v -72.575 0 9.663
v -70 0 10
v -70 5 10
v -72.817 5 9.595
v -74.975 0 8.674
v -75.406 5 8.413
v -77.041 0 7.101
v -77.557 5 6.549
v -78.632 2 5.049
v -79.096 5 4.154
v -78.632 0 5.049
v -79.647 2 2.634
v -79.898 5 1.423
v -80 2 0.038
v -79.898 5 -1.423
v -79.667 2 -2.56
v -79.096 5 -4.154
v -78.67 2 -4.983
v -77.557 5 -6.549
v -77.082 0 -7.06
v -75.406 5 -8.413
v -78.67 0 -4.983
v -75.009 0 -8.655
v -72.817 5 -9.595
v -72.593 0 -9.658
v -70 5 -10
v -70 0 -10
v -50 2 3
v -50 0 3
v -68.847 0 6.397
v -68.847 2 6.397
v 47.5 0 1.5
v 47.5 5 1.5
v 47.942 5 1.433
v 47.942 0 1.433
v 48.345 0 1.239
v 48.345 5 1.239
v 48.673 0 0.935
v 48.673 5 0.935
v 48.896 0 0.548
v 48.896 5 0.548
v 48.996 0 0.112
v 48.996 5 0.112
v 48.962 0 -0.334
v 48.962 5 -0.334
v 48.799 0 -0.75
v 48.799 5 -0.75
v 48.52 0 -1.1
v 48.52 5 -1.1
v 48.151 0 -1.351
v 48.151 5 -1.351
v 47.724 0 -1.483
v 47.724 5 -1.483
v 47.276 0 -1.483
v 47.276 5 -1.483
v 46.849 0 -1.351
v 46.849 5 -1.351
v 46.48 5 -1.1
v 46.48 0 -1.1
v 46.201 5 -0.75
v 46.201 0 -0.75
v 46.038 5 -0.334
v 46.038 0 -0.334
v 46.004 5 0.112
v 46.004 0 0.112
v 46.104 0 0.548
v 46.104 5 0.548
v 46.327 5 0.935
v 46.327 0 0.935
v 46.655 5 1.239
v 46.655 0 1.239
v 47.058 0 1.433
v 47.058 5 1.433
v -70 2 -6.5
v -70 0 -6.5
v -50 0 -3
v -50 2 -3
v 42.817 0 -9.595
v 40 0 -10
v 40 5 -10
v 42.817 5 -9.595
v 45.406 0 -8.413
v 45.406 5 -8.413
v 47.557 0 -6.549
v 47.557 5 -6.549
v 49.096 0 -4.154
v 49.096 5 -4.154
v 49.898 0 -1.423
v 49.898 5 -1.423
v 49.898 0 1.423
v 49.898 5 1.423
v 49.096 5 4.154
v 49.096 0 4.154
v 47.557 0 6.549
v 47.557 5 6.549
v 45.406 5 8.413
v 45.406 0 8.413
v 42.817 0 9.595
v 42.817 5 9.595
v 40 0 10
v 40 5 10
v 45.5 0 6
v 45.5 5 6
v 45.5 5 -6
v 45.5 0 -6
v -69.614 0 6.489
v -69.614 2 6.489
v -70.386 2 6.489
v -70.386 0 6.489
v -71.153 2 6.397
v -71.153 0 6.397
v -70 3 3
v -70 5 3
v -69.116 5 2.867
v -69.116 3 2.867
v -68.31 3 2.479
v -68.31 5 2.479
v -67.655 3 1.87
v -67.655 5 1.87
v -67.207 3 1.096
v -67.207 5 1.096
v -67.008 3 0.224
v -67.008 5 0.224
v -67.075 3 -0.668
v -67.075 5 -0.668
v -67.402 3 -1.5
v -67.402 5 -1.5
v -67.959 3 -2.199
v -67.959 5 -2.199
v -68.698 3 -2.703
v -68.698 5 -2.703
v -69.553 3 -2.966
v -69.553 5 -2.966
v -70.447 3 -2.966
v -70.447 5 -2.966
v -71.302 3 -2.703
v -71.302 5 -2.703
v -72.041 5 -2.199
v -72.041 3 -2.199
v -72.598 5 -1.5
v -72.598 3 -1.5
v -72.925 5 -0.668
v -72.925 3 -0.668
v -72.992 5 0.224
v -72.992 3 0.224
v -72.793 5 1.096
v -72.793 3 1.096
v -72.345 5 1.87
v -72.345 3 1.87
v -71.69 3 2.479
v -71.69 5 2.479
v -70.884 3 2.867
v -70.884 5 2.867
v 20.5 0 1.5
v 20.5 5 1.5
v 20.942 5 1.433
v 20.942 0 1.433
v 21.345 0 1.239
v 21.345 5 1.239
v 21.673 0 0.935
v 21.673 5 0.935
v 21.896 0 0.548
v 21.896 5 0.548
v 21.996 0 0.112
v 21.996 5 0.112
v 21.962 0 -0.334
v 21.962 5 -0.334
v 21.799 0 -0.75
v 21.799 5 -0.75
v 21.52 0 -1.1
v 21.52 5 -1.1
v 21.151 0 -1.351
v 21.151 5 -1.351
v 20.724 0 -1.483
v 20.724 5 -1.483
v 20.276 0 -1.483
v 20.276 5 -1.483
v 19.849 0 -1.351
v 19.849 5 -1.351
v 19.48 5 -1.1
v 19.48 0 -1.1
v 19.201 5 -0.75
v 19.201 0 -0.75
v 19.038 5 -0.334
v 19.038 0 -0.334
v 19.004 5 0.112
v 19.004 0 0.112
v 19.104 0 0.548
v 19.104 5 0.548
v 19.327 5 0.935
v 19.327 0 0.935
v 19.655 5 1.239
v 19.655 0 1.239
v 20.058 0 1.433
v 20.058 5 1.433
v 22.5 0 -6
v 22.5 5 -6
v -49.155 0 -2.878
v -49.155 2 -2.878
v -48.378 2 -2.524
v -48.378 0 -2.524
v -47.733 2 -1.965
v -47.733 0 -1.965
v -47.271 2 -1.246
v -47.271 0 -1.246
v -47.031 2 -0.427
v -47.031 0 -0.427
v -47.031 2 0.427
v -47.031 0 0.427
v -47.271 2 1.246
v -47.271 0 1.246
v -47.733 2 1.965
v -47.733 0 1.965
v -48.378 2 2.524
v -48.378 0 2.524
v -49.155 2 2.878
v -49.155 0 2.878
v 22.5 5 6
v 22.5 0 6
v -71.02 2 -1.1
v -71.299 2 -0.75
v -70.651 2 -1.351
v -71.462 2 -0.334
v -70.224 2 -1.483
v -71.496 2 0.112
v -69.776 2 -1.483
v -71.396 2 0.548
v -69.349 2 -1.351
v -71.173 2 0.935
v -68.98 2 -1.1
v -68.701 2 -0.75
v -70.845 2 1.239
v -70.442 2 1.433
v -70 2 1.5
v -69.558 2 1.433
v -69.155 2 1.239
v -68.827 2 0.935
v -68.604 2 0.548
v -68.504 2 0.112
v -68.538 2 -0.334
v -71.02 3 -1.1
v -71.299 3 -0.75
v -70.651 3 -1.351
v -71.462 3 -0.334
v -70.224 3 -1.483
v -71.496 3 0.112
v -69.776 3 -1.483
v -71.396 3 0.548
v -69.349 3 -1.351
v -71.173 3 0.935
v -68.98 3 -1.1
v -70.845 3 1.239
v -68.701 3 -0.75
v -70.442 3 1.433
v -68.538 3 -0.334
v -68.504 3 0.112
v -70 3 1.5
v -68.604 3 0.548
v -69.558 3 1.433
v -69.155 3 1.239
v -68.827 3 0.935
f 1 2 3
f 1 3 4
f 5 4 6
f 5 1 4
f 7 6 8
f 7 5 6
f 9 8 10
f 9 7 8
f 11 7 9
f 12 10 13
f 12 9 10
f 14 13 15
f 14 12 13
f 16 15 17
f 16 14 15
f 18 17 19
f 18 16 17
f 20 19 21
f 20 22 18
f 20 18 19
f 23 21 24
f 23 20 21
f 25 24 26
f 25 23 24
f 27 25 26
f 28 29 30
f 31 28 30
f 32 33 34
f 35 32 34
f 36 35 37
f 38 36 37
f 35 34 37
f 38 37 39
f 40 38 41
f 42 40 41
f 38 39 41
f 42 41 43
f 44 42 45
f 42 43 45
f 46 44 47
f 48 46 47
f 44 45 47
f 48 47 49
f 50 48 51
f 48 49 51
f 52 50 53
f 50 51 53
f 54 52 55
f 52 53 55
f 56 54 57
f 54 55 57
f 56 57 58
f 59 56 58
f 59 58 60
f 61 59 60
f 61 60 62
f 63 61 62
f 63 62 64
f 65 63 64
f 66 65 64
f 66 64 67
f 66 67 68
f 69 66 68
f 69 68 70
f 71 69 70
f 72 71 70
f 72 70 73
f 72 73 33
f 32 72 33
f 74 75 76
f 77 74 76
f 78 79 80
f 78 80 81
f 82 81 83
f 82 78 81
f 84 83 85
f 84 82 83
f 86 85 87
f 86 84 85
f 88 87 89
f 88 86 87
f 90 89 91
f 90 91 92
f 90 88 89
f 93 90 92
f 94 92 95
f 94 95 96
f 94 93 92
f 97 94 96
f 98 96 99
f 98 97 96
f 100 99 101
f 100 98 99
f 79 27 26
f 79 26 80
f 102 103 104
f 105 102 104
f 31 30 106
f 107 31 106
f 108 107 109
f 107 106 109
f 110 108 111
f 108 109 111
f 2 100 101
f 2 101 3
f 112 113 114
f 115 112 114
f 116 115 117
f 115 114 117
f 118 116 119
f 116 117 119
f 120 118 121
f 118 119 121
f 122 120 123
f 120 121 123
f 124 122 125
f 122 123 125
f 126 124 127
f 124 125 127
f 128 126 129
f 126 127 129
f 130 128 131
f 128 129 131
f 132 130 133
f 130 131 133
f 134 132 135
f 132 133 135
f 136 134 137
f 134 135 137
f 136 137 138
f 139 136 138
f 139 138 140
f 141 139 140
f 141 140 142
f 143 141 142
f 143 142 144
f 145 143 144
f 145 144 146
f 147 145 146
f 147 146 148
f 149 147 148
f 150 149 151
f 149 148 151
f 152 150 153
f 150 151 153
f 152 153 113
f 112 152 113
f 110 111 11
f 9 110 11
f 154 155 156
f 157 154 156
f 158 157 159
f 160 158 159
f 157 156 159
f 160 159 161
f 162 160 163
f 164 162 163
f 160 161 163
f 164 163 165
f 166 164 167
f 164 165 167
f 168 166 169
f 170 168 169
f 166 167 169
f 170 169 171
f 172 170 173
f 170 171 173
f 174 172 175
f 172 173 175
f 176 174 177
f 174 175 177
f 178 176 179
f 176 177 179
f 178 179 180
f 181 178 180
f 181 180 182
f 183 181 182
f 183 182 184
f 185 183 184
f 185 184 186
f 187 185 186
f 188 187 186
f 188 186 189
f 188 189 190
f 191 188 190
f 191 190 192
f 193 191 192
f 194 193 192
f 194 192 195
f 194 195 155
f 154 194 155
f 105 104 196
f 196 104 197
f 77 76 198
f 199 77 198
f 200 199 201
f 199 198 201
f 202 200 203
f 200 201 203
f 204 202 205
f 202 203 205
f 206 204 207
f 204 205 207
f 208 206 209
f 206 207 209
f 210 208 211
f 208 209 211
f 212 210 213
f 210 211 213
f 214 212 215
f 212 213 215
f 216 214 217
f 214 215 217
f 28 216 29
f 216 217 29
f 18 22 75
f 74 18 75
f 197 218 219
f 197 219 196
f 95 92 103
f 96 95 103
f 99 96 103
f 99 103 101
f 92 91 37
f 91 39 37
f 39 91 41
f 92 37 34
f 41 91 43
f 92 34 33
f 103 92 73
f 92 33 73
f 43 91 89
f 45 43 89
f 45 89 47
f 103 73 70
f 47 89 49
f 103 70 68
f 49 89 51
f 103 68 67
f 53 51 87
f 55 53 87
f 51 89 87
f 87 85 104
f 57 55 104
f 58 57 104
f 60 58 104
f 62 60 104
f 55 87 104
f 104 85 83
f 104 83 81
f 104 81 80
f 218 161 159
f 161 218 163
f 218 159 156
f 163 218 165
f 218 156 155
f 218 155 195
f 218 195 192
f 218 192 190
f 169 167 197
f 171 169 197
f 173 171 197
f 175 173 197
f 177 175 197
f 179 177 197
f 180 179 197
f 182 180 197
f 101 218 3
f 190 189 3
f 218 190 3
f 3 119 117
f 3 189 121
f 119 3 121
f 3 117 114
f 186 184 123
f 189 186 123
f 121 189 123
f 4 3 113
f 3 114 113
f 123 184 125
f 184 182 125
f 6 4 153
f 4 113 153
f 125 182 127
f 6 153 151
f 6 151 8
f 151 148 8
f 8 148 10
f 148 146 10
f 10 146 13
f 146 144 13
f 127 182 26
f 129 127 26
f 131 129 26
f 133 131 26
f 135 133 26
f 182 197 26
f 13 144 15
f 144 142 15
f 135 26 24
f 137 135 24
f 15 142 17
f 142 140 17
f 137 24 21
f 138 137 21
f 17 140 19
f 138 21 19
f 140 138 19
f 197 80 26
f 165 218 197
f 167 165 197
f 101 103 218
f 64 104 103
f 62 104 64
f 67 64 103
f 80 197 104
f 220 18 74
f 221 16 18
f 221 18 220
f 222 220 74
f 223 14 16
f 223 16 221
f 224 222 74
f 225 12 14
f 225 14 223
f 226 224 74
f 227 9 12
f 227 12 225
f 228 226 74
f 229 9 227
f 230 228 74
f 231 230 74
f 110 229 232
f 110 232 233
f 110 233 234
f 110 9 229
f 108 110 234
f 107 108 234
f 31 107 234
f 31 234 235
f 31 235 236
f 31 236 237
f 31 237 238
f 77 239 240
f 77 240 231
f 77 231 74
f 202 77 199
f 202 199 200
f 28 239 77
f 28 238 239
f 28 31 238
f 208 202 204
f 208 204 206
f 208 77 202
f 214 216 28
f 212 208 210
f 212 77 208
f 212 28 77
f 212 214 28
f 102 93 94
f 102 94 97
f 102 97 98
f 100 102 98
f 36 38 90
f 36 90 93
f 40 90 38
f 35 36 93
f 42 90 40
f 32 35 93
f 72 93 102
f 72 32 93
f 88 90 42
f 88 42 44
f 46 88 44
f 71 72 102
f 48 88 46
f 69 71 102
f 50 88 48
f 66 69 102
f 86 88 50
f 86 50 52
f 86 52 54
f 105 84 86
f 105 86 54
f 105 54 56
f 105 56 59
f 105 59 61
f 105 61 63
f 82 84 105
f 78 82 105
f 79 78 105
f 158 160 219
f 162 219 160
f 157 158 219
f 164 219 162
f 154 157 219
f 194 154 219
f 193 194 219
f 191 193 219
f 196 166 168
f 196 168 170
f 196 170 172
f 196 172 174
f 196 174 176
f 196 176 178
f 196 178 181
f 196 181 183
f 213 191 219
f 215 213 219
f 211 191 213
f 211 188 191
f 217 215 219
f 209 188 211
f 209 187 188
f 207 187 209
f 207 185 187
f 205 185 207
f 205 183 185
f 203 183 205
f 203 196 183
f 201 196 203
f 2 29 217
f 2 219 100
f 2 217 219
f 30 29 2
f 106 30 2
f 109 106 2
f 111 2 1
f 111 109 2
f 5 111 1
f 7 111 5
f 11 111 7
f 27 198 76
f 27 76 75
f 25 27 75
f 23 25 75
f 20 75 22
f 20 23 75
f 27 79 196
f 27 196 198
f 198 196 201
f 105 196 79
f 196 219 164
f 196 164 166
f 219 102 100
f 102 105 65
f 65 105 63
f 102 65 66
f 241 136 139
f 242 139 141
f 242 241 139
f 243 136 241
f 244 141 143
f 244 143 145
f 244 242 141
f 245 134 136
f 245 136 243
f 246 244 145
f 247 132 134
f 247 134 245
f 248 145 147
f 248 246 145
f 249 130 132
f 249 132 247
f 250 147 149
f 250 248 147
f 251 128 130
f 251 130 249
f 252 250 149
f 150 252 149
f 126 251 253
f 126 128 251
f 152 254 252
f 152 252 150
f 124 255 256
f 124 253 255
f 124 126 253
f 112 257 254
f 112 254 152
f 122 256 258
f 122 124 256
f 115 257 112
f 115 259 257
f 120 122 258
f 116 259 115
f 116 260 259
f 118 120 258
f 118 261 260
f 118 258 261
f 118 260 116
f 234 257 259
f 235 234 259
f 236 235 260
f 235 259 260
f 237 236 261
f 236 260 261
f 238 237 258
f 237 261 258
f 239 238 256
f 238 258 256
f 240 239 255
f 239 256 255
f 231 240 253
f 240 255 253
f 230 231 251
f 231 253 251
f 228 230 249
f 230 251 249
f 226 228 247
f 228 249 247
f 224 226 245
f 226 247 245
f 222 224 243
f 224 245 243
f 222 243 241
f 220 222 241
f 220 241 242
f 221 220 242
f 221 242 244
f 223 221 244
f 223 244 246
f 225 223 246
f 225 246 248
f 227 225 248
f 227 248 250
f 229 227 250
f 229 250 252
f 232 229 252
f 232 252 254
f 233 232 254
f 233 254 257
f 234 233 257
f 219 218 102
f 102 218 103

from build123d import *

# Parameters (mm, degrees)
BOSS_EXTRUDE1_DEPTH = 5
SKETCH3_W           = 17.5
SKETCH3_H           = 12
SKETCH3_W_2         = 5.5
SKETCH3_R           = 1.5
CUT_EXTRUDE1_DEPTH  = 81.777472107
SKETCH5_R           = 3
CUT_EXTRUDE2_DEPTH  = 2
CUT_EXTRUDE3_DEPTH  = 2
SKETCH8_R           = 1.5
CUT_EXTRUDE4_DEPTH  = 81.678373806


with BuildPart() as part:
    # Sketch1 → Boss-Extrude1 (new body)
    with BuildSketch(Plane(origin=(0, 0, 0), x_dir=(1, 0, 0), z_dir=(0, 1, 0))):
        with BuildLine():
            Line((-40, 10), (40, 10))
            ThreePointArc((40, 10), (50, 0), (40, -10))
            Line((40, -10), (-40, -10))
            Line((-40, -10), (-70, -10))
            ThreePointArc((-70, -10), (-80, 0), (-70, 10))
            Line((-70, 10), (-40, 10))
        make_face()
    extrude(amount=BOSS_EXTRUDE1_DEPTH)

    # Sketch3 → Cut-Extrude1 (cut, through all)
    with BuildSketch(Plane(origin=(0, 5, 0), x_dir=(1, 0, 0), z_dir=(0, 1, 0))):
        with Locations((31.25, 0)):
            Rectangle(SKETCH3_W, SKETCH3_H)
        with Locations((42.75, 0)):
            Rectangle(SKETCH3_W_2, SKETCH3_H)
        with Locations(Location((20.5, 0, 0), (0, 0, 270))):
            Circle(SKETCH3_R)
        with Locations(Location((47.5, 0, 0), (0, 0, 270))):
            Circle(SKETCH3_R)
    extrude(amount=-CUT_EXTRUDE1_DEPTH, mode=Mode.SUBTRACT)

    # Sketch5 → Cut-Extrude2 (cut)
    with BuildSketch(Plane(origin=(0, 5, 0), x_dir=(1, 0, 0), z_dir=(0, 1, 0))):
        with Locations(Location((-70, 0, 0), (0, 0, 270))):
            Circle(SKETCH5_R)
    extrude(amount=-CUT_EXTRUDE2_DEPTH, mode=Mode.SUBTRACT)

    # Sketch6 → Cut-Extrude3 (cut)
    with BuildSketch(Plane.XZ):
        with BuildLine():
            Line((-71.152960707, 6.396927513), (-78.631797828, 5.04896685))
            ThreePointArc((-78.631797828, 5.04896685), (-79.999926685, 0.038292326), (-78.670211746, -4.982712945))
            Line((-78.670211746, -4.982712945), (-70, -6.5))
            Line((-70, -6.5), (-50, -3))
            ThreePointArc((-50, -3), (-47, 0), (-50, 3))
            Line((-50, 3), (-68.847039198, 6.396927496))
            ThreePointArc((-68.847039198, 6.396927496), (-69.999999952, 6.5), (-71.152960707, 6.396927513))
        make_face()
    extrude(amount=-CUT_EXTRUDE3_DEPTH, mode=Mode.SUBTRACT)

    # Sketch8 → Cut-Extrude4 (cut, through all)
    with BuildSketch(Plane(origin=(0, 3, 0), x_dir=(1, 0, 0), z_dir=(0, 1, 0))):
        with Locations(Location((-70, 0, 0), (0, 0, 270))):
            Circle(SKETCH8_R)
    extrude(amount=-CUT_EXTRUDE4_DEPTH, mode=Mode.SUBTRACT)


solid = part.part
